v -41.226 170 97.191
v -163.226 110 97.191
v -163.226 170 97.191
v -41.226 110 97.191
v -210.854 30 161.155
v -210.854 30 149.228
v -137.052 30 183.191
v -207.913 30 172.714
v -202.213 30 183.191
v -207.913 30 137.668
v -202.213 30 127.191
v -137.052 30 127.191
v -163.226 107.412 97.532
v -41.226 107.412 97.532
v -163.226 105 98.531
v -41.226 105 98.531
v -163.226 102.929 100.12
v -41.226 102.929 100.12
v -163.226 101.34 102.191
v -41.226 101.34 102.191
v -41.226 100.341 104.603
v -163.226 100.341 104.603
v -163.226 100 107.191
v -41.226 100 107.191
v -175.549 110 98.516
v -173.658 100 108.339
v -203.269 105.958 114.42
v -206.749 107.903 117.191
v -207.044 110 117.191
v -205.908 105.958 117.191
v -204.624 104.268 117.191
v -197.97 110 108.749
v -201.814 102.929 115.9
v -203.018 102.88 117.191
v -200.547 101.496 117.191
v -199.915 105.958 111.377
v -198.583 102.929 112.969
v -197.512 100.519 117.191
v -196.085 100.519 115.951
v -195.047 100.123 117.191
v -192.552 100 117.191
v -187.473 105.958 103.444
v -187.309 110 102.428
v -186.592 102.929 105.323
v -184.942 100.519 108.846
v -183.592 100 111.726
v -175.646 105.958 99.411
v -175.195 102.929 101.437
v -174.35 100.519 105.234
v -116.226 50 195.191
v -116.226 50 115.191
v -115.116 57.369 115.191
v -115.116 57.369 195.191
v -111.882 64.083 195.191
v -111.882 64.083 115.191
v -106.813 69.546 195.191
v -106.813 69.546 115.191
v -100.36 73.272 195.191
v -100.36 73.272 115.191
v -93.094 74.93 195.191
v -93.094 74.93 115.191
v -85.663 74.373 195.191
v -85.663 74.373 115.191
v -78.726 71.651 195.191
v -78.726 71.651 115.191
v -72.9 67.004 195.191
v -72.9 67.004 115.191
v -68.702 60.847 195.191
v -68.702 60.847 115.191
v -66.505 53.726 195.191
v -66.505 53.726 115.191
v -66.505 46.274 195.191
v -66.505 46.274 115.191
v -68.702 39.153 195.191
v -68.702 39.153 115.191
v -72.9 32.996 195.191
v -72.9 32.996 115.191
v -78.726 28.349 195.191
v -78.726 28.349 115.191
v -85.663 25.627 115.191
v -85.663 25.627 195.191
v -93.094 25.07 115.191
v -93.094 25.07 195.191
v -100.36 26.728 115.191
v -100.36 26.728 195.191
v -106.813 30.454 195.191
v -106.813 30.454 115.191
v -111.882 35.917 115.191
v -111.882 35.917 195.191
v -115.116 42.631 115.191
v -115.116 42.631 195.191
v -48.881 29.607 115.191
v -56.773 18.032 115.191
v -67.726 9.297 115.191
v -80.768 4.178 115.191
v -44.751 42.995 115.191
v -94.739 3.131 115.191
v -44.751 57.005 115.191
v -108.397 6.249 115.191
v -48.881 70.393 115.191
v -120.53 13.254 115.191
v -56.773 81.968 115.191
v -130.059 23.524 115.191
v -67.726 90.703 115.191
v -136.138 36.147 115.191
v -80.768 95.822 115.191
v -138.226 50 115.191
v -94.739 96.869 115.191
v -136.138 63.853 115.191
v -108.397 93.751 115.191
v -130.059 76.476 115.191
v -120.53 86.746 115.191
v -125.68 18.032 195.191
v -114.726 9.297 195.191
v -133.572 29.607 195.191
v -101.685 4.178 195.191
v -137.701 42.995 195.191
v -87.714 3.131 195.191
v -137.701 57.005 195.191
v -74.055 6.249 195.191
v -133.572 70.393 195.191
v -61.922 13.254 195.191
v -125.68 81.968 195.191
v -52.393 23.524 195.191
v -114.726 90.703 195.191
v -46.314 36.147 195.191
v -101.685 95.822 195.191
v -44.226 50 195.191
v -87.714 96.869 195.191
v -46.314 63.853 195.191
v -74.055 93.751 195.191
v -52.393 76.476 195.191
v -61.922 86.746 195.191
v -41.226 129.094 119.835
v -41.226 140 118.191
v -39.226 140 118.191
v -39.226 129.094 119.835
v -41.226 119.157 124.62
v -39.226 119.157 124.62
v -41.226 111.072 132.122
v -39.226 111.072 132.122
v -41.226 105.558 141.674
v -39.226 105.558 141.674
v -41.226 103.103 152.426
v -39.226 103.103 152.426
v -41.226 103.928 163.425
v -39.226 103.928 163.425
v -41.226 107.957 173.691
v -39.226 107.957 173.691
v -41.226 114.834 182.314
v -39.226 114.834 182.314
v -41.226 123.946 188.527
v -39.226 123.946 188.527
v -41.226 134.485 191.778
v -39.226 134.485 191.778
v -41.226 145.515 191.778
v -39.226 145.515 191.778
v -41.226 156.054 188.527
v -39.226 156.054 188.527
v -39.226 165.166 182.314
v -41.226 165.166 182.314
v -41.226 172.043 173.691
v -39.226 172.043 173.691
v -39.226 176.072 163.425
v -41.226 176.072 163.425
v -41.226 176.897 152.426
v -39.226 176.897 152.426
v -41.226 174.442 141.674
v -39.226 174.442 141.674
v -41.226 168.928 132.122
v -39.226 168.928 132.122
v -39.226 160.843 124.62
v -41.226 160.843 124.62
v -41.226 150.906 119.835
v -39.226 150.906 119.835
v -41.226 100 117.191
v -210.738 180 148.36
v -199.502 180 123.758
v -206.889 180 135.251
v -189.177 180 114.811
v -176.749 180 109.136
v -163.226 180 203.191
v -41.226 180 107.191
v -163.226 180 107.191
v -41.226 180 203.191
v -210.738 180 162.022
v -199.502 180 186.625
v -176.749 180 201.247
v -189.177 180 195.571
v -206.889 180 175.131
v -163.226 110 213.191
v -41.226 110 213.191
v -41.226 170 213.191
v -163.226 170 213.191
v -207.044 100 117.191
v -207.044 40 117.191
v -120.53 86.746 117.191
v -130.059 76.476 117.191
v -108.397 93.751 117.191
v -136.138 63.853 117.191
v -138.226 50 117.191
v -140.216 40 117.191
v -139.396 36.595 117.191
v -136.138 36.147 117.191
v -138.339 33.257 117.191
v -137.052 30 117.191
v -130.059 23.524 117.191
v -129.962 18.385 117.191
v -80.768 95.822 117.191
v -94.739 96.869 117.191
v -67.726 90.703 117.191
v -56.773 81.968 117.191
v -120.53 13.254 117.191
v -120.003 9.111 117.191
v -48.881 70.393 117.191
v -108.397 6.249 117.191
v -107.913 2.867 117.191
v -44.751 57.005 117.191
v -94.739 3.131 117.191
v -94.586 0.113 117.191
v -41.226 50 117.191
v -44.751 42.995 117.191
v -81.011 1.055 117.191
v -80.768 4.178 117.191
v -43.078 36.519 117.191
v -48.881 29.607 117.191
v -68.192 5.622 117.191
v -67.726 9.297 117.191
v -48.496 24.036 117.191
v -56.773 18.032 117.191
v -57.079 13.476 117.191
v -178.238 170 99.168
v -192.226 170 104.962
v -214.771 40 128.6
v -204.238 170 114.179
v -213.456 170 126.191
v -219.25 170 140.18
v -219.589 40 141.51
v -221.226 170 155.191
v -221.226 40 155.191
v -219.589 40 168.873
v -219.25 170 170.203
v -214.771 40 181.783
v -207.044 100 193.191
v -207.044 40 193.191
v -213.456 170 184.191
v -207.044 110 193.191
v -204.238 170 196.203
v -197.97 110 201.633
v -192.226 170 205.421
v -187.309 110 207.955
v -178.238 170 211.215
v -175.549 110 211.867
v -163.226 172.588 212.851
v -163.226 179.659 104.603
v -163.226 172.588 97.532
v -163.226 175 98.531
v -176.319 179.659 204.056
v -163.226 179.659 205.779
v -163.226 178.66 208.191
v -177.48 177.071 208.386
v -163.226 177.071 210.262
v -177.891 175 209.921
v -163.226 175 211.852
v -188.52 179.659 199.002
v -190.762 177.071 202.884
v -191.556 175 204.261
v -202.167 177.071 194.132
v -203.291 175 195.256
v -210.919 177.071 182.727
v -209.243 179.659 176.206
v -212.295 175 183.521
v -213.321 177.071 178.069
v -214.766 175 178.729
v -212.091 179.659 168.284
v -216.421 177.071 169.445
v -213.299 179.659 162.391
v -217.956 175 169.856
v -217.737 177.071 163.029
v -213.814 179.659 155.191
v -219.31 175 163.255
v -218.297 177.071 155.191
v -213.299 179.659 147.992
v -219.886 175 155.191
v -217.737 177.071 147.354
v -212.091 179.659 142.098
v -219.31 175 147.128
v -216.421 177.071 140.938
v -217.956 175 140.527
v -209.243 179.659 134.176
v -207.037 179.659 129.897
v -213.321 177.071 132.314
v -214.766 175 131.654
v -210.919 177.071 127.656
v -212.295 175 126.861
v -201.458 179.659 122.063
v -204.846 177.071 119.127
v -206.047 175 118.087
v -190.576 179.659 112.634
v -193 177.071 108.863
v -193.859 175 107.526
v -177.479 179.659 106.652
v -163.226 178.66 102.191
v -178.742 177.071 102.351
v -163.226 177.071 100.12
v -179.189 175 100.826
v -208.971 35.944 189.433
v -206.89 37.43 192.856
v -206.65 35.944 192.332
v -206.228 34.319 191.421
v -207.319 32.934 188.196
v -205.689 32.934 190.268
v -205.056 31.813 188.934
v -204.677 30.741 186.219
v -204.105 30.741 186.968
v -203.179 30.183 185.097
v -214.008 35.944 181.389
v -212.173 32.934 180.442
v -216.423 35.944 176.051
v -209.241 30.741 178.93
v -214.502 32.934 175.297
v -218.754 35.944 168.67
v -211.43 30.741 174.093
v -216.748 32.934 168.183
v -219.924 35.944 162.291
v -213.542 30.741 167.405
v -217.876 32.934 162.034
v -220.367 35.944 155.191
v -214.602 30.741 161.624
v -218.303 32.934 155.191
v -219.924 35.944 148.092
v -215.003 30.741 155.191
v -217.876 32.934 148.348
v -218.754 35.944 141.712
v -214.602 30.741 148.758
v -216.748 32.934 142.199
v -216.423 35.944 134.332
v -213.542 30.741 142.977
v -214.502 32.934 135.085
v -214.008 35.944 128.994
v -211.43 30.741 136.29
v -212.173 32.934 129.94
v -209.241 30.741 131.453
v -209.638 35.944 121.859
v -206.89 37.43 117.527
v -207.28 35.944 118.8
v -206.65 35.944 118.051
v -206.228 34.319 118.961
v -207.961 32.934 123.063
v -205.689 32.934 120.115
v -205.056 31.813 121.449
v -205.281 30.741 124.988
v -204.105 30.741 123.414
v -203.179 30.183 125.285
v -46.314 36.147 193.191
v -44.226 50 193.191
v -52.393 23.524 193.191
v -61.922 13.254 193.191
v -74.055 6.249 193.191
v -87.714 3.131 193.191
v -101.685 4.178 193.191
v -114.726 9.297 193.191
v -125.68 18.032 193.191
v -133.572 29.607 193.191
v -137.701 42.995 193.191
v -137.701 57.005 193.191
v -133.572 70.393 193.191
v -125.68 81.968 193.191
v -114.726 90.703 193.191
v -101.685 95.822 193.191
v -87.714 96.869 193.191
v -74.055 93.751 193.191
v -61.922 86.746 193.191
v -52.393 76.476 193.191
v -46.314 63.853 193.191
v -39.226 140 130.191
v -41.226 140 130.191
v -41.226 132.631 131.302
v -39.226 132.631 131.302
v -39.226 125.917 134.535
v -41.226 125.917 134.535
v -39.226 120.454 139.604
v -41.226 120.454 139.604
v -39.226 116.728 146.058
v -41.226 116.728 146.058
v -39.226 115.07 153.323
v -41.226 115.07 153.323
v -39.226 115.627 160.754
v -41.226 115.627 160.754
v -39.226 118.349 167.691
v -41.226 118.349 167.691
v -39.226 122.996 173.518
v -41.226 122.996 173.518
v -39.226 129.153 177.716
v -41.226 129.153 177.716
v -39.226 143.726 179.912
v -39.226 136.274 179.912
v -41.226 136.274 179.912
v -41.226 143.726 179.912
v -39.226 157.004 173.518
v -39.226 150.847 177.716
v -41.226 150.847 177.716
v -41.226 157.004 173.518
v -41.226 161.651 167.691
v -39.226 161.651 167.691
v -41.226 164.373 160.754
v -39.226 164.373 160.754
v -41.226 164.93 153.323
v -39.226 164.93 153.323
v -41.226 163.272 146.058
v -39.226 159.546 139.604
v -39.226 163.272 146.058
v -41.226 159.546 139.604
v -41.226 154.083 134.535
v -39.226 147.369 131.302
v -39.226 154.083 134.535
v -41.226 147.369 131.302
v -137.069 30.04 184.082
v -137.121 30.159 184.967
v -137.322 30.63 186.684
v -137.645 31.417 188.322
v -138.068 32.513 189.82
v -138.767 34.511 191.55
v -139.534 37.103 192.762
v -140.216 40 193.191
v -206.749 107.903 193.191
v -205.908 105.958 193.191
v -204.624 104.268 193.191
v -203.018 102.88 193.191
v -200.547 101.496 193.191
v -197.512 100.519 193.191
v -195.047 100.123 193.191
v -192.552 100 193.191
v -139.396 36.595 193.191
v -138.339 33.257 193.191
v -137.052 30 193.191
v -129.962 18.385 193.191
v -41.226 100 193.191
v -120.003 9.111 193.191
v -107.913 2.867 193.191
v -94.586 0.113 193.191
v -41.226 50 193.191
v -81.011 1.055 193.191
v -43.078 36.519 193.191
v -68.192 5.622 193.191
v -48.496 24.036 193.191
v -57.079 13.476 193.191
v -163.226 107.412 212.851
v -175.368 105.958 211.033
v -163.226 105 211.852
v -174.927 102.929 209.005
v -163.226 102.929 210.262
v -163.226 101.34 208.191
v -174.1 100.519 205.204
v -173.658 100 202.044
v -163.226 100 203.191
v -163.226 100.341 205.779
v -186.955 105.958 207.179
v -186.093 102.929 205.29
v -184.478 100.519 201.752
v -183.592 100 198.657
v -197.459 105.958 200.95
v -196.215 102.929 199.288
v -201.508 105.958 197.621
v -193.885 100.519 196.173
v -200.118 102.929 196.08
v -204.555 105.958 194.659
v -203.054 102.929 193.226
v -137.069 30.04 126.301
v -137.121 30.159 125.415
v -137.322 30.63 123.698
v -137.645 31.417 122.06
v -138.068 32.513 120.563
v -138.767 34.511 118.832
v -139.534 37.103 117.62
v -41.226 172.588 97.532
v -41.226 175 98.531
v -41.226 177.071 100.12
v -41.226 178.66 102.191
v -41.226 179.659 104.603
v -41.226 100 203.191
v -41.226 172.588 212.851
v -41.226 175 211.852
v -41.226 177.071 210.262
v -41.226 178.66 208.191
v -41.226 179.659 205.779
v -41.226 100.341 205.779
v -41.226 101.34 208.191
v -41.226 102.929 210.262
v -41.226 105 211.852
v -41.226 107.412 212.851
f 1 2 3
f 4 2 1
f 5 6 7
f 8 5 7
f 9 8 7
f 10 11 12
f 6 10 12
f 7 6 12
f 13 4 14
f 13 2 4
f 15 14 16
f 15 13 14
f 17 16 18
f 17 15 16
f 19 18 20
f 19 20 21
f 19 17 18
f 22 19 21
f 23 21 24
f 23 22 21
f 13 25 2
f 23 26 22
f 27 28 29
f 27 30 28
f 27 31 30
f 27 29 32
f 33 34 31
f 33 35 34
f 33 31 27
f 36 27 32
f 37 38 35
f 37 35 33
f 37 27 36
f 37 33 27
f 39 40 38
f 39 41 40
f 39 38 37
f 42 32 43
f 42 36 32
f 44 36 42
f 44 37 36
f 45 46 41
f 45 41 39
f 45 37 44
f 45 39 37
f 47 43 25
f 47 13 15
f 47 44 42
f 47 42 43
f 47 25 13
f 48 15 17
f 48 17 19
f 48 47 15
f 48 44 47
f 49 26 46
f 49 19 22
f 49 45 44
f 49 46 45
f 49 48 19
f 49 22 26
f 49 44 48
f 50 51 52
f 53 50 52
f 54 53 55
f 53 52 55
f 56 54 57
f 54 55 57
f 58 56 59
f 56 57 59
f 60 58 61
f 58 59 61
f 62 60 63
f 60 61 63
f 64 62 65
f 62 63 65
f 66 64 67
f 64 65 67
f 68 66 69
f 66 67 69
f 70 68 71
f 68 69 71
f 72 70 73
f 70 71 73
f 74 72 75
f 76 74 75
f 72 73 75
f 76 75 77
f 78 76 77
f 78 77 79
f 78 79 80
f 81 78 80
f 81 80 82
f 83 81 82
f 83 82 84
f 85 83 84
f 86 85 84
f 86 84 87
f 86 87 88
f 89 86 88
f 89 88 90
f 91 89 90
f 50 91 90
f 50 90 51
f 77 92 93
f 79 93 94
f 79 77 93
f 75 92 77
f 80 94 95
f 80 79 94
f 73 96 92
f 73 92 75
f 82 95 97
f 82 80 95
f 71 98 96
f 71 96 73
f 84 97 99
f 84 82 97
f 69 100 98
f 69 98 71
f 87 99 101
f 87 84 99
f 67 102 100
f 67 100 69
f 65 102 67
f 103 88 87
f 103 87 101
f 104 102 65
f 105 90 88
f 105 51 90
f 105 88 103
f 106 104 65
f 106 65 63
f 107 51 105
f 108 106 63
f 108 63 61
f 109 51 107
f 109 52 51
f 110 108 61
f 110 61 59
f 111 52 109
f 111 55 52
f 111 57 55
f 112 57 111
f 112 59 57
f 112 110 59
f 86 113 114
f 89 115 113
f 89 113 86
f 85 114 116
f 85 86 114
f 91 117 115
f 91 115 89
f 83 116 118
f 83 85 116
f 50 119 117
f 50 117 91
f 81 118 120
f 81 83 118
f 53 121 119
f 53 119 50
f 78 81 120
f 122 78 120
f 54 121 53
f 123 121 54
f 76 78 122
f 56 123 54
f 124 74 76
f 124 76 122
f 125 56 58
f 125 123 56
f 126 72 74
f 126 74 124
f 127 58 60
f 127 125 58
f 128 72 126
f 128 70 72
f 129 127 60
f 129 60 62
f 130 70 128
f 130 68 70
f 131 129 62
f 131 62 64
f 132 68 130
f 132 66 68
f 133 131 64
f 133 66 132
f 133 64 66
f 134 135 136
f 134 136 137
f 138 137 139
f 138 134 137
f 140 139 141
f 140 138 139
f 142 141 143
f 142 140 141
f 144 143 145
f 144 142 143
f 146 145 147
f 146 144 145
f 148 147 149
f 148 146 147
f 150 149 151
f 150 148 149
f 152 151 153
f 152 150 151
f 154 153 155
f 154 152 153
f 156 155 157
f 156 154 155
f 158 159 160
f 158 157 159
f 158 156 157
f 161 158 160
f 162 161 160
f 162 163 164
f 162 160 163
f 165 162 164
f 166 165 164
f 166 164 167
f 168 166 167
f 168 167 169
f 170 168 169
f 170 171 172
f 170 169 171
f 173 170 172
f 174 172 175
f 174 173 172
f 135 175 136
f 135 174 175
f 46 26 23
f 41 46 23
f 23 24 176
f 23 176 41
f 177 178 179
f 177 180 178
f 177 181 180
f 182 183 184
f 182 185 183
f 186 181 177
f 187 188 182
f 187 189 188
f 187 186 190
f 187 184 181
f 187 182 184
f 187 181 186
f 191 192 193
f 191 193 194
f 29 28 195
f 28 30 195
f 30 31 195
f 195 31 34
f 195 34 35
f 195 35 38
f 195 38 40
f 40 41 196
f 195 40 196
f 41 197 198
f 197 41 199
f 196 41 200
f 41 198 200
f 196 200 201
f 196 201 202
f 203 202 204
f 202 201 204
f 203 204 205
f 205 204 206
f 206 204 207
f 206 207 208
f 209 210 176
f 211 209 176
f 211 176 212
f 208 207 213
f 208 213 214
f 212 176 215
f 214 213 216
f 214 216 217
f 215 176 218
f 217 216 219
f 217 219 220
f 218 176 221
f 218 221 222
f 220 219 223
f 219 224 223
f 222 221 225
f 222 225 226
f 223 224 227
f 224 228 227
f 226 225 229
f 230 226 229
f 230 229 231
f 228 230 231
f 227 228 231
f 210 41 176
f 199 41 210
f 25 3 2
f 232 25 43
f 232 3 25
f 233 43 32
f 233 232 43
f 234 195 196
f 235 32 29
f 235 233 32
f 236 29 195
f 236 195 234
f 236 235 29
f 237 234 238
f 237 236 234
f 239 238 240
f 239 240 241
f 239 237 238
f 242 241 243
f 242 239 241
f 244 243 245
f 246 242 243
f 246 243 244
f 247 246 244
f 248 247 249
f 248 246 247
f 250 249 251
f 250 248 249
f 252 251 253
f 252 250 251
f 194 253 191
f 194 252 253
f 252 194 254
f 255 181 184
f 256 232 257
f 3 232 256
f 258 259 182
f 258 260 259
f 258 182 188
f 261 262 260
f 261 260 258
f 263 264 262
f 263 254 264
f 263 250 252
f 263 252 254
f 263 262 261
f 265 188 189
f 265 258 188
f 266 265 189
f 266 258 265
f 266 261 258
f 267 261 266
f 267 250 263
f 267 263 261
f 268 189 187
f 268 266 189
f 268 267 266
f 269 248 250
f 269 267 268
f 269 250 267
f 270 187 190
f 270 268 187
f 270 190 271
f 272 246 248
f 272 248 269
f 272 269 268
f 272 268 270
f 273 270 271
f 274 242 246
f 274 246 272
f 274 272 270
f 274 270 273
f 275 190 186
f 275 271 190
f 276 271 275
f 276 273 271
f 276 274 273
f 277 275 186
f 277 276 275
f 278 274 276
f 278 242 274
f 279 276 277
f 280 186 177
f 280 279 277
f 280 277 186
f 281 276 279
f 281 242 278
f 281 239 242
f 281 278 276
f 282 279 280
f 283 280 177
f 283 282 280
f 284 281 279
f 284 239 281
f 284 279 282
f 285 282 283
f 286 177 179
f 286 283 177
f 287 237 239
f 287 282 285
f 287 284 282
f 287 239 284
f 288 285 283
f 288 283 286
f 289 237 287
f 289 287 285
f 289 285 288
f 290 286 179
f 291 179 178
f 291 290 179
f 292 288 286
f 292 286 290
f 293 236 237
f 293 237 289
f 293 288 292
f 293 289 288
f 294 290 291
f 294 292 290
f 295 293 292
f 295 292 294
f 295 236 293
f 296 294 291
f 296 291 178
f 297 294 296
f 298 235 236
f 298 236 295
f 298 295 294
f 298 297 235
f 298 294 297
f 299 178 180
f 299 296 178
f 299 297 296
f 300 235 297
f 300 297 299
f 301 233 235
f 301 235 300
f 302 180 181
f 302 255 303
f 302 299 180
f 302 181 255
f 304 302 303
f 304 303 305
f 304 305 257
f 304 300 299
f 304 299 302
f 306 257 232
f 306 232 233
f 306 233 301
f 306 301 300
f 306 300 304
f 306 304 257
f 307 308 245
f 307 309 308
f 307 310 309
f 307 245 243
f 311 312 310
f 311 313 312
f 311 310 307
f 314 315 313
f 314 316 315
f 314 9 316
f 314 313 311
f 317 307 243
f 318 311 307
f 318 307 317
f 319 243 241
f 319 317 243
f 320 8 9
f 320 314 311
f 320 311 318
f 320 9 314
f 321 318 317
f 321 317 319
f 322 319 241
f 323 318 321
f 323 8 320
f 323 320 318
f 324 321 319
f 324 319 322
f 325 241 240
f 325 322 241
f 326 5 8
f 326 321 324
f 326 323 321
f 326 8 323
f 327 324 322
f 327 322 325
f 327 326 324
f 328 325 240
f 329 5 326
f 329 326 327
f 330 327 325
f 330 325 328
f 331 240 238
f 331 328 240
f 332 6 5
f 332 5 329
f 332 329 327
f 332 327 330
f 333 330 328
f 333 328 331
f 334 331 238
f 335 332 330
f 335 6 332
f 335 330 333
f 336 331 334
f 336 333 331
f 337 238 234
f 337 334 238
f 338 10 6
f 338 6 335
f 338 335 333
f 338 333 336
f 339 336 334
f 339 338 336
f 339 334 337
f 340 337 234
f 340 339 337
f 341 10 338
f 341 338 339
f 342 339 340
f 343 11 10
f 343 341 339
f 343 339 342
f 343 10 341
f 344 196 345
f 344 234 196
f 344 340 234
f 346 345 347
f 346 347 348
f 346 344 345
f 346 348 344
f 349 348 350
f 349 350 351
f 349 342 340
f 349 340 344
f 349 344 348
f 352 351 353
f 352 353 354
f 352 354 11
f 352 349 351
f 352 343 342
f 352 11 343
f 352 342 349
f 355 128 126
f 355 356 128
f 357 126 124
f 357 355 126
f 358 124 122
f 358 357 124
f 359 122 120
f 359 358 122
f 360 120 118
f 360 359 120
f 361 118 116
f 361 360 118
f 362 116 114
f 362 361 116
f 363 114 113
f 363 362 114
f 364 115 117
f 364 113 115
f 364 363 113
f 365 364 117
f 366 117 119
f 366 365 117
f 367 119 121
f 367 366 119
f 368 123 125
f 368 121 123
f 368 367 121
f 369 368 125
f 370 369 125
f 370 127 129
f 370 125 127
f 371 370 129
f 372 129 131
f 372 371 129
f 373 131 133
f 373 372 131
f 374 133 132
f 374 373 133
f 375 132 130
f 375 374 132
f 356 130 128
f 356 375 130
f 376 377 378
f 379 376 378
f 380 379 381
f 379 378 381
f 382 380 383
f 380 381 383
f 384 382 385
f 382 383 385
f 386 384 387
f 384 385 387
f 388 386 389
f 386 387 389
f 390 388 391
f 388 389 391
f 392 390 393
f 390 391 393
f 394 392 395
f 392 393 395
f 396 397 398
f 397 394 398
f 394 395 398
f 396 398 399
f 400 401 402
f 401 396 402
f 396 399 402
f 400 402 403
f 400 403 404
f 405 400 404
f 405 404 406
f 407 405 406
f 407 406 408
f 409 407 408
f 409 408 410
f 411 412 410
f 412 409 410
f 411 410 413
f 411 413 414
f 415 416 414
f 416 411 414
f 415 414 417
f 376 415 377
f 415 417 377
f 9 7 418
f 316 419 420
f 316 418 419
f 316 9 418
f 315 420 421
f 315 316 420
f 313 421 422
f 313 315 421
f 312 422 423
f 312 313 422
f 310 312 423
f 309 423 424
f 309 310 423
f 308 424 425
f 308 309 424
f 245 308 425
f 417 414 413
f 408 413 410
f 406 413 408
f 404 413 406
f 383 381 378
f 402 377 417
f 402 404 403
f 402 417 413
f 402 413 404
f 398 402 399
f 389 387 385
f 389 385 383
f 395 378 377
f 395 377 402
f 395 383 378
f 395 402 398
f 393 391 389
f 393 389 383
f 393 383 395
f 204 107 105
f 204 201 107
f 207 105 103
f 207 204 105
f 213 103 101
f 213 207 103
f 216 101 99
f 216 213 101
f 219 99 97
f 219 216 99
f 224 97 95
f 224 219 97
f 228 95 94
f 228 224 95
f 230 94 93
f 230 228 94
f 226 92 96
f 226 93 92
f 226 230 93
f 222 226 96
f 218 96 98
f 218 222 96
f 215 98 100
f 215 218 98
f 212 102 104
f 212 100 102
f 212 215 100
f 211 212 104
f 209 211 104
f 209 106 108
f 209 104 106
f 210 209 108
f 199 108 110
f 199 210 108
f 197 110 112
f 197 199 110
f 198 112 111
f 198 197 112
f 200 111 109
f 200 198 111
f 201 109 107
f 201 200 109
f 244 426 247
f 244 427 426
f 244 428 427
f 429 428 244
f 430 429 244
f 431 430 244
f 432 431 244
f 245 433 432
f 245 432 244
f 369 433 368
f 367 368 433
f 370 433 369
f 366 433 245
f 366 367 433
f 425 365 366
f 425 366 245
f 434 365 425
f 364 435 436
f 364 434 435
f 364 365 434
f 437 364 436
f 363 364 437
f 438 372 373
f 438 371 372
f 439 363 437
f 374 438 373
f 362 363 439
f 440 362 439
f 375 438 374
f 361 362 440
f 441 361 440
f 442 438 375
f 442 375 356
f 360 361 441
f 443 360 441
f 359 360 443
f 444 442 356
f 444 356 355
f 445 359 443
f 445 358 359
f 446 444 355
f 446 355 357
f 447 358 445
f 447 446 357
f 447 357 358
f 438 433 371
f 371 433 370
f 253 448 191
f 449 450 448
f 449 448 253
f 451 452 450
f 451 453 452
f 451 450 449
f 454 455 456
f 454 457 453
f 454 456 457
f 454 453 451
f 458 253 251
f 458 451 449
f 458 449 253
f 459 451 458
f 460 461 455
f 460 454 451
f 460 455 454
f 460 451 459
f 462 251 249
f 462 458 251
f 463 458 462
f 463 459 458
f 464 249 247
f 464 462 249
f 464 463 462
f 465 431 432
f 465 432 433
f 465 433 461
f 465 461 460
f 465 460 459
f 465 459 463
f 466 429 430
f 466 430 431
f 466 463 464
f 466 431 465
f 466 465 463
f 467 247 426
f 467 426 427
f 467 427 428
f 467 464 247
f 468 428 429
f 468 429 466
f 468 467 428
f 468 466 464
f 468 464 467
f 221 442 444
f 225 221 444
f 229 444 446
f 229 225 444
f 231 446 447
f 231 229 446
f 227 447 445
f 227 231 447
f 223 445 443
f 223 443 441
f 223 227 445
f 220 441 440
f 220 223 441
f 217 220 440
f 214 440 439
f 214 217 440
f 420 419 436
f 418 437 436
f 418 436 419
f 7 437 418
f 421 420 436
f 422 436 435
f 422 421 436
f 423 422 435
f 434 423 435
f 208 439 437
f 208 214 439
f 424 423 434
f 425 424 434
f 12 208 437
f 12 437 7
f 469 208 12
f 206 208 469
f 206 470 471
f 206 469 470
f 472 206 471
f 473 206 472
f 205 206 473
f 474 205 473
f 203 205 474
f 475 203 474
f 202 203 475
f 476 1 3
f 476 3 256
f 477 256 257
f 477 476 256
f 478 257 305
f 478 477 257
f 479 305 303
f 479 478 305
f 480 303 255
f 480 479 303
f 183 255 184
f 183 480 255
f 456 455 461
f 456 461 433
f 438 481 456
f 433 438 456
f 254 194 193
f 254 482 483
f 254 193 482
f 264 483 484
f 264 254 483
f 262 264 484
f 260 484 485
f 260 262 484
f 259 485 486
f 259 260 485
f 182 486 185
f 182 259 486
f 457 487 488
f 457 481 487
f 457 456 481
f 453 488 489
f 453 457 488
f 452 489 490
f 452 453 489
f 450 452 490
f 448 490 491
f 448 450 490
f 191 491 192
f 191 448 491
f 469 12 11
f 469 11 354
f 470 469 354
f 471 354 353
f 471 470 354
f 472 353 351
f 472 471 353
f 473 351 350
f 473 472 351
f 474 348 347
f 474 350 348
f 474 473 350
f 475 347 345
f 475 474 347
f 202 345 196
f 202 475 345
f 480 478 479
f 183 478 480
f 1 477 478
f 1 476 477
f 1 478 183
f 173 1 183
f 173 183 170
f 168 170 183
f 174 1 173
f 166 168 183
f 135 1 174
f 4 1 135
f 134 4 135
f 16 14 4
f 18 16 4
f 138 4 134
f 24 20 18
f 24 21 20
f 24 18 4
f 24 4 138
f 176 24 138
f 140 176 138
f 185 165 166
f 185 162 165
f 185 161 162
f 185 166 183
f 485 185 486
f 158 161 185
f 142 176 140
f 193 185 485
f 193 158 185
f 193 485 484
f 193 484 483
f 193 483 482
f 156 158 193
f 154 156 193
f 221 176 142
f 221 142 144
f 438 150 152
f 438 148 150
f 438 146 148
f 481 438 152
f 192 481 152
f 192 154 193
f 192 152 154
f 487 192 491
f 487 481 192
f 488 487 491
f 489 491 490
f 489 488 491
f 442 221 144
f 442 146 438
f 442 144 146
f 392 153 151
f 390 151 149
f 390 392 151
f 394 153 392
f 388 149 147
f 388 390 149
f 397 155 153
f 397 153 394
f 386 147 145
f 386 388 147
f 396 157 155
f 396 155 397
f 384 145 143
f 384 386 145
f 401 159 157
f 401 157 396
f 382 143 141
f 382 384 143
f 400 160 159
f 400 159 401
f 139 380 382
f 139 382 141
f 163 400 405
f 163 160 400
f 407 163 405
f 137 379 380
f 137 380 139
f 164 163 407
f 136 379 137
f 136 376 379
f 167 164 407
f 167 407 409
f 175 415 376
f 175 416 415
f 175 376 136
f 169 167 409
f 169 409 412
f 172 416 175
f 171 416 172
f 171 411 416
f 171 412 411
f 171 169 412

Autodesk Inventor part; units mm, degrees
ref_plane "YZ Plane" through (0, 0, 0) normal (1, 0, 0) x (0, 1, 0)
ref_plane "XZ Plane" through (0, 0, 0) normal (0, 1, 0) x (-1, 0, 0)
ref_plane "XY Plane" through (0, 0, 0) normal (0, 0, 1) x (1, 0, 0)
sketch "Sketch1" plane through (0, 0, 0) normal (0, 1, 0) x (-1, 0, 0)
  line L0 (221.2262, 97.1913) -> (41.2262, 97.1913)
  line L1 (41.2262, 97.1913) -> (41.2262, 213.1913)
  line L2 (41.2262, 213.1913) -> (221.2262, 213.1913)
  line L3 (221.2262, 213.1913) -> (221.2262, 97.1913)
  point P0 (0, 0)
  dimension "d2" = 180
  dimension "d3" = 116
extrude "Extrusion1" add sketch "Sketch1" along normal blind 180
sketch "Sketch2" plane through (-41.2262, 0, 97.1913) normal (0, 0, -1) x (-1, 0, 0)
  point P0 (-41.2262, 0)
sketch "Sketch3" plane through (-41.2262, 0, 213.1913) normal (1, 0, 0) x (0, 0, -1)
  line L0 (0, 0) -> (20, 0)
  line L1 (0, 0) -> (116, 0) projected
  line L2 (20, 0) -> (96, 0)
  line L3 (20, 0) -> (0, 0)
  line L4 (0, 0) -> (0, 100)
  line L5 (0, 100) -> (20, 100)
  line L6 (20, 100) -> (20, 0)
  line L7 (96, 0) -> (116, 0)
  line L8 (116, 0) -> (116, 100)
  line L9 (116, 100) -> (96, 100)
  line L10 (96, 100) -> (96, 0)
  point P0 (213.1913, 0)
  dimension "d6" = 20
  dimension "d7" = 76
  dimension "d8" = 20
  dimension "d9" = 100
  dimension "d10" = 20
  dimension "d11" = 100
extrude "Extrusion2" cut sketch "Sketch3" against normal blind 200 contours L4 L5 L6 L0
extrude "Extrusion3" cut sketch "Sketch3" against normal blind 200 contours L10 L9 L8 L1
sketch "Sketch4" plane through (-41.2262, 0, 117.1913) normal (0, 0, -1) x (-1, 0, 0)
  circle A0 centre (50, 50) radius 50
  line L0 (180, 0) -> (0, 0) projected
  line L1 (0, 0) -> (0, 100) projected
  circle A1 centre (50, 50) radius 47
  line L2 (180, 0) -> (180, 30)
  line L3 (180, 0) -> (180, 100) projected
  line L4 (180, 30) -> (95.8258, 30)
  point P0 (-41.2262, 0)
  point P1 (0, 50)
  point P2 (50, 0)
  dimension "d16" = 100
  dimension "d17" = 94
  dimension "d29" = 30
extrude "Extrusion4" add sketch "Sketch4" along normal blind 2 contours A1
sketch "Sketch5" plane through (-41.2262, 0, 193.1913) normal (0, 0, 1) x (1, 0, 0)
  circle A0 centre (-50, 50) radius 50
  line L0 (0, 100) -> (0, 0) projected
  line L1 (0, 0) -> (-180, 0) projected
  circle A1 centre (-50, 50) radius 47
  point P0 (41.2262, 0)
  dimension "d20" = 100
  dimension "d21" = 94
extrude "Extrusion5" add sketch "Sketch5" along normal blind 2 contours A1
sketch "Sketch6" plane through (-91.2262, 50, 115.1913) normal (0, 0, -1) x (-1, 0, 0)
  circle A0 centre (0, 0) radius 25
  point P0 (-91.2262, -50)
  dimension "d24" = 50
extrude "Extrusion6" cut sketch "Sketch6" against normal blind 200
extrude "Extrusion7" cut sketch "Sketch4" against normal blind 200 contours L0 L1 A0
sketch "Sketch7" plane through (-41.2262, 100, 117.1913) normal (0, 0, -1) x (-1, 0, 0)
  point P0 (-41.2262, -100)
extrude "Extrusion8" cut sketch "Sketch4" against normal blind 200 contours L4 L2 L0 A0
sketch "Sketch8" plane through (0, 180, 0) normal (0, 1, 0) x (1, 0, 0)
  circle A0 centre (-163.2262, -155.1913) radius 58
  line L0 (-221.2262, -97.1913) -> (-221.2262, -213.1913) projected
  line L1 (-221.2262, -213.1913) -> (-41.2262, -213.1913) projected
  line L2 (-41.2262, -213.1913) -> (-41.2262, -97.1913) projected
  line L3 (-221.2262, -213.1913) -> (-41.2262, -213.1913)
  line L4 (-41.2262, -213.1913) -> (-41.2262, -97.1913)
  line L5 (-221.2262, -97.1913) -> (-221.2262, -213.1913)
  line L6 (-221.2262, -97.1913) -> (-41.2262, -97.1913)
  line L7 (-221.2262, -97.1913) -> (-221.2262, -117.1913) projected
  point P0 (0, 0)
  point P1 (-163.2262, -97.1913)
  point P2 (-221.2262, -155.1913)
  point P3 (-163.2262, -213.1913)
  dimension "d32" = 116
extrude "Extrusion9" cut sketch "Sketch8" against normal blind 200 contours A0 L0 L6
extrude "Extrusion10" cut sketch "Sketch8" against normal blind 200 contours L1 L0 A0
sketch "Sketch10" plane through (-41.2262, 180, 213.1913) normal (1, 0, 0) x (0, 0, -1)
  circle A0 centre (58, -40) radius 37
  circle A1 centre (58, -40) radius 25
  point P0 (213.1913, -180)
  dimension "d39" = 74
  dimension "d40" = 50
extrude "Extrusion11" add sketch "Sketch10" along normal blind 2
fillet "Fillet2" radius 10 2 edges at (-187.3094, 100, 102.4277) (-102.2262, 100, 97.1913)
fillet "Fillet3" radius 10 7 edges at (-102.2262, 100, 213.1913) (-102.2262, 180, 213.1913) (-102.2262, 180, 97.1913) (-221.2262, 180, 155.1913) (-221.2262, 30, 155.1913) (-172.048, 30, 117.1913) (-172.048, 30, 193.1913)
